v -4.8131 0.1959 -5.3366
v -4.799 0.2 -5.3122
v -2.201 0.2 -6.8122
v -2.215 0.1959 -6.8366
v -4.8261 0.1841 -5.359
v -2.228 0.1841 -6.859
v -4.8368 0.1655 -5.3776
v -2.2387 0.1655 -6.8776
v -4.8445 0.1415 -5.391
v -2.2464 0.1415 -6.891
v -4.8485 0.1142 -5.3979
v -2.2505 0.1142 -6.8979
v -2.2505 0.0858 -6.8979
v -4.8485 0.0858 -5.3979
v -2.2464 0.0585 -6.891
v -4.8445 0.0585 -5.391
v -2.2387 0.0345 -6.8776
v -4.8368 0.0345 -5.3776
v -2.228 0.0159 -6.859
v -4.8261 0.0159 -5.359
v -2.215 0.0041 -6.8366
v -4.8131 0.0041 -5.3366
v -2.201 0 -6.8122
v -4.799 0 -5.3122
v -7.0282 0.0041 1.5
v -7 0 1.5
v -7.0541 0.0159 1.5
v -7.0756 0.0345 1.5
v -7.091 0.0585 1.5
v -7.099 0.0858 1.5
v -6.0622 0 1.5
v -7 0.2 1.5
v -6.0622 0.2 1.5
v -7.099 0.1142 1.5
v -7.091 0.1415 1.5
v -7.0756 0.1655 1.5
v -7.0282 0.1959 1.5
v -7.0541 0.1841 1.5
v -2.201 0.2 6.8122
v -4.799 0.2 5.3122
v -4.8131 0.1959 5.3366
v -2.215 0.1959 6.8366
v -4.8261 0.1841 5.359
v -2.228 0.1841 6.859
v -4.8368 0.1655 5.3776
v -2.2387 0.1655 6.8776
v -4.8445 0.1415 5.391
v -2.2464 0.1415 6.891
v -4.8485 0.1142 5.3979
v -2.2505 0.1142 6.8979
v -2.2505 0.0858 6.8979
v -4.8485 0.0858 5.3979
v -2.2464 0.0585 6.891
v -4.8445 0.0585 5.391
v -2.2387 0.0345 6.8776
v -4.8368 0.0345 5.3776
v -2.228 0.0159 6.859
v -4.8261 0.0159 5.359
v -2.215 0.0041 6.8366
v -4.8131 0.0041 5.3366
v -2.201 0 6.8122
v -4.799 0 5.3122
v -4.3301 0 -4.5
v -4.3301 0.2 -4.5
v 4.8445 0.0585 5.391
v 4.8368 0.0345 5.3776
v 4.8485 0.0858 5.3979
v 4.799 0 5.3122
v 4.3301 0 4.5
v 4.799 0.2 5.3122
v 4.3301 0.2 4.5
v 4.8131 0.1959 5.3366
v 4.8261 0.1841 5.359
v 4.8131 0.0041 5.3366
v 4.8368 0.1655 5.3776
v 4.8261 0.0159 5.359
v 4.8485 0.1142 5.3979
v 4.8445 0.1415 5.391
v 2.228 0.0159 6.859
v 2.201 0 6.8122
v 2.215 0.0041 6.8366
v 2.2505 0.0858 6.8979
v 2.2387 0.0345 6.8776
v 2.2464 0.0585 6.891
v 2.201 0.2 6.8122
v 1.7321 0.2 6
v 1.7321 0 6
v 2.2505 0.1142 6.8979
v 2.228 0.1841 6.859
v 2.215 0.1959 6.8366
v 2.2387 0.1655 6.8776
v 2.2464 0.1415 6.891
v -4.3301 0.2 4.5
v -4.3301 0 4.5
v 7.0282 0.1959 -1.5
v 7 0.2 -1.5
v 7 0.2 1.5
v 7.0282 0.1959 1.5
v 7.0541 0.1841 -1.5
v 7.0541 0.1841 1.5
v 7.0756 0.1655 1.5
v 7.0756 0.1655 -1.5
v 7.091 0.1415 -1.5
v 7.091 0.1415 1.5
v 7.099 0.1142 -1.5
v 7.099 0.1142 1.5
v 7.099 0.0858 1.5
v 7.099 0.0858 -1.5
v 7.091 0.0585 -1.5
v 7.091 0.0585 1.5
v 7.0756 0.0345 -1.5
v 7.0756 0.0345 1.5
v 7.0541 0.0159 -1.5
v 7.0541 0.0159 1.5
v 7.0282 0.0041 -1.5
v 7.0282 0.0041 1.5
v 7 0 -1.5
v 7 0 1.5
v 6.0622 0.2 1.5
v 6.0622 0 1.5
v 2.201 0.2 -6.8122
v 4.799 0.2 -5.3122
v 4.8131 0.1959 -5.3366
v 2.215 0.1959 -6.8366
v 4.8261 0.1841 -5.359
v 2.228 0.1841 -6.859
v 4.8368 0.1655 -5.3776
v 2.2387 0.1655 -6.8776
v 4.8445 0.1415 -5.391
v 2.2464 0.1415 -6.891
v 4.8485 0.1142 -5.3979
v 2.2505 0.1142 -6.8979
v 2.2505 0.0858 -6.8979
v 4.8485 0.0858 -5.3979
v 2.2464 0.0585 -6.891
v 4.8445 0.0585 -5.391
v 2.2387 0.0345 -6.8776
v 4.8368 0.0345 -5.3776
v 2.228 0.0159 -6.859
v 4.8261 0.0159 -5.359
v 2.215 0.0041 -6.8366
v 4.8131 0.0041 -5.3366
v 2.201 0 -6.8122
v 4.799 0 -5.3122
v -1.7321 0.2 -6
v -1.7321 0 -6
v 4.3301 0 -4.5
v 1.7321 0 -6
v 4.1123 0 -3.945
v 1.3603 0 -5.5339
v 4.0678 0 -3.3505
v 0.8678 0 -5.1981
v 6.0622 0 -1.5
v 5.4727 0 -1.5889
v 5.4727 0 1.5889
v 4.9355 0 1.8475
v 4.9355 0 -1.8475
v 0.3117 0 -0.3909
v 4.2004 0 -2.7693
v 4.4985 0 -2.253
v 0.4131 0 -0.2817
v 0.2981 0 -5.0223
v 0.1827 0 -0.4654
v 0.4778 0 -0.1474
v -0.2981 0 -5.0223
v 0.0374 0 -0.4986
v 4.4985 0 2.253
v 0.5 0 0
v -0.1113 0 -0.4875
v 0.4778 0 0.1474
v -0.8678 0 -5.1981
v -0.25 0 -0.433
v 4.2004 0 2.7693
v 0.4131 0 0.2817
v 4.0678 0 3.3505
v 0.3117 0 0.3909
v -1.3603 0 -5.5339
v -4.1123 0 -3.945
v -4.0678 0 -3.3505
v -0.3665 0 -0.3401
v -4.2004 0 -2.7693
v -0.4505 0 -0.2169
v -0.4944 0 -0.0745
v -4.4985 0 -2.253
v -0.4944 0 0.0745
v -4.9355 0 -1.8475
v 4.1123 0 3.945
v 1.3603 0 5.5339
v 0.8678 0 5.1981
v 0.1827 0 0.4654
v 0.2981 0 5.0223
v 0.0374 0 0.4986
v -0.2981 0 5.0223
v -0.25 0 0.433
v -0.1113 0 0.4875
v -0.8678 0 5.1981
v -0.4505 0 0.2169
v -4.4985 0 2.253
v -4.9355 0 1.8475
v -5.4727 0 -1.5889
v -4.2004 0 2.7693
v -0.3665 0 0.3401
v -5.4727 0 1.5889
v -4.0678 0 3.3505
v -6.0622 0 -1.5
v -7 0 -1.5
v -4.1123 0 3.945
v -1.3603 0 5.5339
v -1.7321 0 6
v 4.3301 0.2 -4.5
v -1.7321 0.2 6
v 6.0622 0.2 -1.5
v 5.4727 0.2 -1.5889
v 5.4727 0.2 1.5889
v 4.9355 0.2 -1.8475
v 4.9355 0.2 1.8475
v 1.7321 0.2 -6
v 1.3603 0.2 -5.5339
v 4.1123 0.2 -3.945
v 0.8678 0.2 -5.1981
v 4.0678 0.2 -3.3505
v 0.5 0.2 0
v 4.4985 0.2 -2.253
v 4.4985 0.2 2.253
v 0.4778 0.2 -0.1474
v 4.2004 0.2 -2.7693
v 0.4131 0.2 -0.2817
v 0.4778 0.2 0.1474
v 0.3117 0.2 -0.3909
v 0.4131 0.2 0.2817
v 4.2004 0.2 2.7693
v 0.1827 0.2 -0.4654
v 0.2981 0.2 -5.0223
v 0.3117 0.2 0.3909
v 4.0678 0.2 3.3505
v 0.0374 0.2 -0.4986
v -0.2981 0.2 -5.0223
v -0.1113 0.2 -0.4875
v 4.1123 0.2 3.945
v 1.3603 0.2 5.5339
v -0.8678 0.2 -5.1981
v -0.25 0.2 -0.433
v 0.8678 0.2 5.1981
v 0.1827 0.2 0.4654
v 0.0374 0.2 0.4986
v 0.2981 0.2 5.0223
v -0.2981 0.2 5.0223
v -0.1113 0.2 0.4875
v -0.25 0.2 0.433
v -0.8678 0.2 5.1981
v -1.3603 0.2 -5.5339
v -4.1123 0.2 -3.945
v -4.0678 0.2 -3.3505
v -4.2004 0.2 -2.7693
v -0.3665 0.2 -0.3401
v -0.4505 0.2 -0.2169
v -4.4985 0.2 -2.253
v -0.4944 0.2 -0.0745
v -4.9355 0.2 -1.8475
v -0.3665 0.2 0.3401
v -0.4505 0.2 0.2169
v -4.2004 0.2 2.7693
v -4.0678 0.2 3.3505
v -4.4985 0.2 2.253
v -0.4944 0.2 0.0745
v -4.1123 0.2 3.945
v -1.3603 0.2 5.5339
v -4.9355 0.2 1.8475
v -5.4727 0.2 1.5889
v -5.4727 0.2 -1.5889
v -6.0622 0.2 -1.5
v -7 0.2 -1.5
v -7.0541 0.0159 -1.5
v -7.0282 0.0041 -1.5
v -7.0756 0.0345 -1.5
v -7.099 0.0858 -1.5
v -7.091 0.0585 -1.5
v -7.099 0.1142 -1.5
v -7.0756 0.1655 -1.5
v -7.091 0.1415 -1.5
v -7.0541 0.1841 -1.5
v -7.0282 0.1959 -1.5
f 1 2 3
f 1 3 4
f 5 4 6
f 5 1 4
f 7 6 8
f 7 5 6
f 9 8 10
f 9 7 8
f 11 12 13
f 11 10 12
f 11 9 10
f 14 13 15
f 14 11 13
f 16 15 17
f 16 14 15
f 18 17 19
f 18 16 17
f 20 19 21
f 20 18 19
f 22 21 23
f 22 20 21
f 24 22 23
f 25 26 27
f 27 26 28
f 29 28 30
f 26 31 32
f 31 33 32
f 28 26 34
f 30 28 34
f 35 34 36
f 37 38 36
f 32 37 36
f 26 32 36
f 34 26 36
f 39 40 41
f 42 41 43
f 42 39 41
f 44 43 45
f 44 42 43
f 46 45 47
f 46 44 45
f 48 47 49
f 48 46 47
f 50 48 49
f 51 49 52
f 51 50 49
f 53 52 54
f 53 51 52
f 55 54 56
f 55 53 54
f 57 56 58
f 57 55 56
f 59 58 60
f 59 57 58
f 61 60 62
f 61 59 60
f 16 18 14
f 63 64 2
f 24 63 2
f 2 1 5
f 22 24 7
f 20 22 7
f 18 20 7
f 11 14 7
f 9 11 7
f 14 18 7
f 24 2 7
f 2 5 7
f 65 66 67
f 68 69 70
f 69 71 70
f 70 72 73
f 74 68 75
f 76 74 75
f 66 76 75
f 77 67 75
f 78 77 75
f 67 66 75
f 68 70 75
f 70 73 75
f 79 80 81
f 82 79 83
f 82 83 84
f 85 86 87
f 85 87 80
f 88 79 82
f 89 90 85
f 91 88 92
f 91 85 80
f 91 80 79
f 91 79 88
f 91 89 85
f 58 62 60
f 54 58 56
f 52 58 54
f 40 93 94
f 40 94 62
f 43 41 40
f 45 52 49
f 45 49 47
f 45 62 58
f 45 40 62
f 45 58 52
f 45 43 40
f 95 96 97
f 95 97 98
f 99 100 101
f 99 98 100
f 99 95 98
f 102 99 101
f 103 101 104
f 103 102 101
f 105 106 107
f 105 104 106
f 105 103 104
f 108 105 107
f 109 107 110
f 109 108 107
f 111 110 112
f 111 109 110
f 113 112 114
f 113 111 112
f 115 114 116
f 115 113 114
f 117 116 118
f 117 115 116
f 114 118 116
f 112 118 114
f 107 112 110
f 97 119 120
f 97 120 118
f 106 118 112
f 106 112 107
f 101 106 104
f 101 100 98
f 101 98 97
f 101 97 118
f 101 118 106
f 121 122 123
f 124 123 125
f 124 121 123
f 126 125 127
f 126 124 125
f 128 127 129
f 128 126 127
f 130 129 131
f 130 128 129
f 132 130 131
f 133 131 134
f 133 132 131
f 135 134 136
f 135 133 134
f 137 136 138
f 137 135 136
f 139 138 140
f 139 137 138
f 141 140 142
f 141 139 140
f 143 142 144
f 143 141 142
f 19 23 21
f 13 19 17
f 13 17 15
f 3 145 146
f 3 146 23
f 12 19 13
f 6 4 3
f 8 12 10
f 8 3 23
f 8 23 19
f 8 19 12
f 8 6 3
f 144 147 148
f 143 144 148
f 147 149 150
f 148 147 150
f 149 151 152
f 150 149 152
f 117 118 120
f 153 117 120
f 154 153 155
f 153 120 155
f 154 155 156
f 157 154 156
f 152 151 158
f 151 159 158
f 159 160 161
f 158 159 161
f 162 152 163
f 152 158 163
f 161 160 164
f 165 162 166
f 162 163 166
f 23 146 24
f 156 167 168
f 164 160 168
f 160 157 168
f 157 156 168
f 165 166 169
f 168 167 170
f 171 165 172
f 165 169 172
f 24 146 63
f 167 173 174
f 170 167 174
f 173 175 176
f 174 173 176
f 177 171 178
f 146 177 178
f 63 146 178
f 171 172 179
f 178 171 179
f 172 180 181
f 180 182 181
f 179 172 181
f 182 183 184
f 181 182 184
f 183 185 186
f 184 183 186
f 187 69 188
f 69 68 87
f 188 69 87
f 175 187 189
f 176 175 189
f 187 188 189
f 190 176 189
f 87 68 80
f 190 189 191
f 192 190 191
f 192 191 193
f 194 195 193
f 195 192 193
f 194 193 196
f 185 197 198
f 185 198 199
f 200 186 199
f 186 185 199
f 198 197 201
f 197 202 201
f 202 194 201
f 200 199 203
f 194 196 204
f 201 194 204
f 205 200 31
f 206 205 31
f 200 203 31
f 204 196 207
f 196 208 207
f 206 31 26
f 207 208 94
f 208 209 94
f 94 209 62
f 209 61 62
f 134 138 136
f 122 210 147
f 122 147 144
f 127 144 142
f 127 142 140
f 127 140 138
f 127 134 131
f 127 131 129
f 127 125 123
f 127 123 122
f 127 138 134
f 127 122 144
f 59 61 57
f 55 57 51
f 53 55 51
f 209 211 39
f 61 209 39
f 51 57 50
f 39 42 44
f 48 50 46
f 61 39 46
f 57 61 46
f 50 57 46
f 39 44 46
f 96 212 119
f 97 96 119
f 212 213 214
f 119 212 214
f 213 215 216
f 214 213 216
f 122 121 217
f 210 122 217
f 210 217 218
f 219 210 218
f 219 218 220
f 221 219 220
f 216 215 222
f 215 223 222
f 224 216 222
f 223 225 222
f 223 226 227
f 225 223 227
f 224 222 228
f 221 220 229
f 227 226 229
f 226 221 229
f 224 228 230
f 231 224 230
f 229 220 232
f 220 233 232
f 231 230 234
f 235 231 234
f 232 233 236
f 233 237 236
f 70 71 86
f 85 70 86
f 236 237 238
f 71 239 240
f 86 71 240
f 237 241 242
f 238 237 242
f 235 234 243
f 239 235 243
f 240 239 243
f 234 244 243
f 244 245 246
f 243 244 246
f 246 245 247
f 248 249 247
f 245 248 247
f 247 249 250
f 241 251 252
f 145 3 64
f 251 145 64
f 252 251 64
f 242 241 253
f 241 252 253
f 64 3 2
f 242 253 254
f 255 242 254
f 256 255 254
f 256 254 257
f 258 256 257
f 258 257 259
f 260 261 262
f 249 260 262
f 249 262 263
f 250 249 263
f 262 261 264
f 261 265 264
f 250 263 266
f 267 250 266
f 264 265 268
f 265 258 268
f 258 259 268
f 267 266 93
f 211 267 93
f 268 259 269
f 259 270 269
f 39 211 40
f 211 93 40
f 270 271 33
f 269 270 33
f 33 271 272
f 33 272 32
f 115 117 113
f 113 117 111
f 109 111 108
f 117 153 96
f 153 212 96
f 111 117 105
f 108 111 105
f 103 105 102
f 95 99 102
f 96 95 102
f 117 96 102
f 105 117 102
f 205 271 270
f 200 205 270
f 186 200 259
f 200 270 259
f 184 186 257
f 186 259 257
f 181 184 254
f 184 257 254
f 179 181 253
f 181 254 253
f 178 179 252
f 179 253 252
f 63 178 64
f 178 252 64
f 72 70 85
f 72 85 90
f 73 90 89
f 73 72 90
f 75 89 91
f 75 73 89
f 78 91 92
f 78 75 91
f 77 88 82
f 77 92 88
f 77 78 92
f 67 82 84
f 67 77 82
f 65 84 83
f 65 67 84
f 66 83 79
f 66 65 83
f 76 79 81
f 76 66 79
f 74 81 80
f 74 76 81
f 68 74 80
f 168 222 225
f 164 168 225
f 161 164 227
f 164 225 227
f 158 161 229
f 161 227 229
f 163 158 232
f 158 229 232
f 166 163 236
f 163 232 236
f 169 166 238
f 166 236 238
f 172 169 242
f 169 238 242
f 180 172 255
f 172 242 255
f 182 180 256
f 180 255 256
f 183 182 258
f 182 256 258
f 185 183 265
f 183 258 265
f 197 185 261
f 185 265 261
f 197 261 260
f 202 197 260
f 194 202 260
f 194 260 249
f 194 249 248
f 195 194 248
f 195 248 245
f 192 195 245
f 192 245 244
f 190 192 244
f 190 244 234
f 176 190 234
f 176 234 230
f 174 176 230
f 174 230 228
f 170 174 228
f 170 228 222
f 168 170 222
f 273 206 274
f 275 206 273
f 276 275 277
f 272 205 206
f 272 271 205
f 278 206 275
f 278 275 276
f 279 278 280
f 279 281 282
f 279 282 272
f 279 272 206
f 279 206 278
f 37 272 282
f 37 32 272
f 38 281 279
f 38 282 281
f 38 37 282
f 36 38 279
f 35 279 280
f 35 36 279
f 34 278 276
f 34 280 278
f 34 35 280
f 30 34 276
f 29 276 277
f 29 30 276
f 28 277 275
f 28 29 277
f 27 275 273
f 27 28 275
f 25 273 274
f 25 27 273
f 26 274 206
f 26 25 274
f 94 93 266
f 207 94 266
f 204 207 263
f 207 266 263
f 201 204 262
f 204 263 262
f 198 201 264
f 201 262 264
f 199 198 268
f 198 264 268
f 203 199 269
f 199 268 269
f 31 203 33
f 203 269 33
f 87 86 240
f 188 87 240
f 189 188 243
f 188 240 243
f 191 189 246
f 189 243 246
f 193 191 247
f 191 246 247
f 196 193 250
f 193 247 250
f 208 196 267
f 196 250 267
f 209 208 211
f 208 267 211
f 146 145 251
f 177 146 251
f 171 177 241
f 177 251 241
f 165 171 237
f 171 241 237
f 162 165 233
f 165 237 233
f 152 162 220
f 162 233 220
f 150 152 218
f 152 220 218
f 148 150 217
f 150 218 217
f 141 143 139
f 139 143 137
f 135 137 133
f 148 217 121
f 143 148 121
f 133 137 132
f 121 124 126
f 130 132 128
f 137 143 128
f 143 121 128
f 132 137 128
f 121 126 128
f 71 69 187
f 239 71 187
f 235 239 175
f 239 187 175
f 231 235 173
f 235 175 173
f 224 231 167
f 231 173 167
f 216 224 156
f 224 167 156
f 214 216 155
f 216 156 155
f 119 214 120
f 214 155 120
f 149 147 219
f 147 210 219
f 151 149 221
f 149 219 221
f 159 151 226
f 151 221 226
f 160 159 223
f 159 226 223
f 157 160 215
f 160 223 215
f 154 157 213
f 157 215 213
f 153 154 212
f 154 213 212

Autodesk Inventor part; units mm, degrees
ref_plane "YZ Plane" through (0, 0, 0) normal (1, 0, 0) x (0, 1, 0)
ref_plane "XZ Plane" through (0, 0, 0) normal (0, 1, 0) x (-1, 0, 0)
ref_plane "XY Plane" through (0, 0, 0) normal (0, 0, 1) x (1, 0, 0)
sketch "Sketch1" plane through (0, 0, 0) normal (0, 1, 0) x (-1, 0, 0)
  circle A0 centre (0, 0) radius 1.5
  dimension "d0" = 3
extrude "Extrusion1" add sketch "Sketch1" along normal blind 0.2
sketch "Sketch2" plane through (0, 0, 0) normal (0, 0, 1) x (1, 0, 0)
  line L0 (0, 0) -> (0, 0.1)
  line L1 (0, 0.1) -> (7, 0.1) construction
  line L2 (0, 0) -> (7, 0)
  line L3 (7, 0.2) -> (0, 0.2)
  arc A0 (0, 0.2) -> (0, 0) centre (0, 0.1) ccw
  arc A1 (7, 0) -> (7, 0.2) centre (7, 0.1) ccw
  line L4 (1.5, 0.2) -> (-1.5, 0.2) projected
  point P0 (3.5, 0.1)
  dimension "d3" = 0.1
  dimension "d4" = 7
  dimension "d5" = 0.2
extrude "Extrusion2" add sketch "Sketch2" along normal mid plane 3
pattern_circular "Circular Pattern1" count 6 over 360 about axis through (0, 0, 0) along (0, 1, 0) of "Extrusion2"
sketch "Sketch3" plane through (0, 0.2, 0) normal (0, 1, 0) x (1, 0, 0)
  circle A0 centre (0, 0) radius 0.5
  dimension "d11" = 1
extrude "Extrusion3" cut sketch "Sketch3" against normal blind 1
fillet "Fillet1" radius 2 6 edges at (0, 0.1, -3) (-2.5981, 0.1, -1.5) (-2.5981, 0.1, 1.5) (0, 0.1, 3) (2.5981, 0.1, 1.5) (2.5981, 0.1, -1.5)
properties part number "mid_7mm"
